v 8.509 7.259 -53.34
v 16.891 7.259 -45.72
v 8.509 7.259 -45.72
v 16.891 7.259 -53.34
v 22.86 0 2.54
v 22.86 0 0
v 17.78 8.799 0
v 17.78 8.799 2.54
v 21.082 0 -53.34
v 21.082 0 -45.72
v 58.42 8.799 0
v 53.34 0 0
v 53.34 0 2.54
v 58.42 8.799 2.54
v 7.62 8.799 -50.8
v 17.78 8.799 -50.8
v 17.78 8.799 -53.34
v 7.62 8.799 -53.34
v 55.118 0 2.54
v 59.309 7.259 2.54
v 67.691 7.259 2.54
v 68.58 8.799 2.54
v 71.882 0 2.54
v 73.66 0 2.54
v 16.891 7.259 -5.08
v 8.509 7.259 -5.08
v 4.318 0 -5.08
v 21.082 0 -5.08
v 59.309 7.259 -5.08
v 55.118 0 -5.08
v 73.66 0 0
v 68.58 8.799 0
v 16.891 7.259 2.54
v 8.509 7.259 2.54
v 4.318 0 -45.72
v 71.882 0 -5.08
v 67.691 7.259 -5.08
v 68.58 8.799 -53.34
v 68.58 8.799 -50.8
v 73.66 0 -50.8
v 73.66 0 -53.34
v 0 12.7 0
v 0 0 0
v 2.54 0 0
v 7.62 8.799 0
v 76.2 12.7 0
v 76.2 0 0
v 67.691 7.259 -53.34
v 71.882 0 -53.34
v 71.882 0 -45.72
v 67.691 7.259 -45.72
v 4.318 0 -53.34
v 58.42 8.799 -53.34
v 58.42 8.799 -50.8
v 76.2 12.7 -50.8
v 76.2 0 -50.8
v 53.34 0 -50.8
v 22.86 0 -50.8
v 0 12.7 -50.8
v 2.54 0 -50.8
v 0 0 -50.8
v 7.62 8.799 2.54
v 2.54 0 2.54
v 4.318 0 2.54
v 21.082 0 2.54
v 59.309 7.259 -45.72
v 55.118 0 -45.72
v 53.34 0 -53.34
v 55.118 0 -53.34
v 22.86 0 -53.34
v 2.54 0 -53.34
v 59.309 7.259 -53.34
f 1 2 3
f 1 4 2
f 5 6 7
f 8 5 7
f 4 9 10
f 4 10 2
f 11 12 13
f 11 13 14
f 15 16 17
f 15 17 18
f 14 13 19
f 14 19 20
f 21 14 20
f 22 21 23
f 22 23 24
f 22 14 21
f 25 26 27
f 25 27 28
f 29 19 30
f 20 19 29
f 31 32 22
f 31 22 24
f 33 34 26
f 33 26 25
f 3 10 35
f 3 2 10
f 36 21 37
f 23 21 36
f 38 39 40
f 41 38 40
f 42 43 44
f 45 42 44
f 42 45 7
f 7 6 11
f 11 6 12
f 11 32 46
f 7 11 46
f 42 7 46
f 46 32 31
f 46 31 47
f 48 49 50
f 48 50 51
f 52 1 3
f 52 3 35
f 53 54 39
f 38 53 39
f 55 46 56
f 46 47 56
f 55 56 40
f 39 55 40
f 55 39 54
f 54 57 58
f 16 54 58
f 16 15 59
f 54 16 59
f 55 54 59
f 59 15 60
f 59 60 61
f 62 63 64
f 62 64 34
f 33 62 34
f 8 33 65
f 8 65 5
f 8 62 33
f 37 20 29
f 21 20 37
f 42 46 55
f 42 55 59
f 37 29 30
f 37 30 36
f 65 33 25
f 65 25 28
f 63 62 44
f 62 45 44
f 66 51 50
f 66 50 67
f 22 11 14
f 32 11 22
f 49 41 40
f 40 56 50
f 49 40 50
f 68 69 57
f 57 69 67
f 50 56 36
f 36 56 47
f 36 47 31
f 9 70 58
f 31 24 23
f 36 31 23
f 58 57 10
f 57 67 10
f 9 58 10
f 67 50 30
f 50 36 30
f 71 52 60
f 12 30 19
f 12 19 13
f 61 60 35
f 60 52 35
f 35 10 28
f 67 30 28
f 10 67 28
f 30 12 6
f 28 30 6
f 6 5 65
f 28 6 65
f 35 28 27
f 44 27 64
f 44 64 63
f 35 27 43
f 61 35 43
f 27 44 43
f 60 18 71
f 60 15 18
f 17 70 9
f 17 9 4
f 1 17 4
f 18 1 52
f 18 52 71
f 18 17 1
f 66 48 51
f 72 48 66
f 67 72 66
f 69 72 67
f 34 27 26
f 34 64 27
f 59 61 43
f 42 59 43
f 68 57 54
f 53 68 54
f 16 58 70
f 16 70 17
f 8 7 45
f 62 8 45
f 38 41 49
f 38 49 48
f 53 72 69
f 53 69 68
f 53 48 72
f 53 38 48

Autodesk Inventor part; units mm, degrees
ref_plane "YZ Plane" through (0, 0, 0) normal (1, 0, 0) x (0, 1, 0)
ref_plane "XZ Plane" through (0, 0, 0) normal (0, 1, 0) x (-1, 0, 0)
ref_plane "XY Plane" through (0, 0, 0) normal (0, 0, 1) x (1, 0, 0)
sketch "Sketch1" plane through (0, 0, 0) normal (0, 1, 0) x (-1, 0, 0)
  line L0 (0, 0) -> (-76.2, 0)
  line L1 (-76.2, 0) -> (-76.2, -50.8)
  line L2 (-76.2, -50.8) -> (0, -50.8)
  line L3 (0, -50.8) -> (0, 0)
  dimension "d0" = 76.2
  dimension "d1" = 50.8
extrude "Extrusion1" add sketch "Sketch1" along normal blind 12.7
sketch "Sketch5" plane through (76.2, 0, -50.8) normal (0, 0, -1) x (-1, 0, 0)
  line L0 (76.2, 0) -> (73.66, 0)
  line L1 (76.2, 0) -> (0, 0) projected
  line L2 (73.66, 0) -> (53.34, 0)
  line L3 (53.34, 0) -> (58.42, 8.7988)
  line L4 (58.42, 8.7988) -> (68.58, 8.7988)
  line L5 (68.58, 8.7988) -> (73.66, 0)
  dimension "d9" = 2.54
  dimension "d10" = 20.32
  dimension "d11" = 10.16
  dimension "d12" = 60
  dimension "d13" = 10.16
extrude "Extrusion2" add sketch "Sketch5" along normal blind 2.54
sketch "Sketch6" plane through (76.2, 12.7, -50.8) normal (0, 0, -1) x (-1, 0, 0)
  line L0 (76.2, -12.7) -> (0, -12.7) projected
  line L1 (0, -12.7) -> (2.54, -12.7)
  line L2 (2.54, -12.7) -> (22.86, -12.7)
  line L3 (22.86, -12.7) -> (17.78, -3.9012)
  line L4 (17.78, -3.9012) -> (7.62, -3.9012)
  line L5 (7.62, -3.9012) -> (2.54, -12.7)
  dimension "d16" = 2.54
  dimension "d17" = 20.32
  dimension "d18" = 10.16
  dimension "d19" = 60
  dimension "d20" = 10.16
extrude "Extrusion3" add sketch "Sketch6" along normal blind 2.54
sketch "Sketch7" plane through (0, 0, 0) normal (0, 0, 1) x (1, 0, 0)
  line L0 (2.54, 0) -> (0, 0) projected
  line L1 (0, 0) -> (2.54, 0)
  line L2 (22.86, 0) -> (2.54, 0) projected
  line L3 (2.54, 0) -> (22.86, 0)
  line L4 (22.86, 0) -> (17.78, 8.7988) projected
  line L5 (22.86, 0) -> (17.78, 8.7988)
  line L6 (17.78, 8.7988) -> (7.62, 8.7988) projected
  line L7 (17.78, 8.7988) -> (7.62, 8.7988)
  line L8 (7.62, 8.7988) -> (2.54, 0) projected
  line L9 (7.62, 8.7988) -> (2.54, 0)
  dimension "d23" = 20.32
  dimension "d24" = 10.16
  dimension "d25" = 60
extrude "Extrusion4" add sketch "Sketch7" along normal blind 2.54
sketch "Sketch8" plane through (0, 12.7, 0) normal (0, 0, 1) x (1, 0, 0)
  line L0 (76.2, -12.7) -> (73.66, -12.7) projected
  line L1 (76.2, -12.7) -> (73.66, -12.7)
  line L2 (53.34, -12.7) -> (58.42, -3.9012) projected
  line L3 (73.66, -12.7) -> (53.34, -12.7)
  line L4 (53.34, -12.7) -> (58.42, -3.9012)
  line L5 (58.42, -3.9012) -> (68.58, -3.9012)
  line L6 (68.58, -3.9012) -> (73.66, -12.7) projected
  line L7 (68.58, -3.9012) -> (73.66, -12.7)
  point P0 (0, -12.7)
  dimension "d28" = 10.16
extrude "Extrusion5" add sketch "Sketch8" along normal blind 2.54
sketch "Sketch10" plane through (76.2, 12.7, -53.34) normal (0, 0, -1) x (-1, 0, 0)
  line L0 (7.62, -3.9012) -> (2.54, -12.7) projected
  line L1 (2.54, -12.7) -> (12.7, -12.7)
  line L2 (2.54, -12.7) -> (22.86, -12.7) projected
  line L3 (2.54, -12.7) -> (4.318, -12.7)
  line L4 (4.318, -12.7) -> (8.509, -5.441)
  line L5 (8.509, -5.441) -> (16.891, -5.441)
  line L6 (16.891, -5.441) -> (21.082, -12.7)
  line L7 (21.082, -12.7) -> (16.891, -19.959)
  line L8 (16.891, -19.959) -> (8.509, -19.959)
  line L9 (8.509, -19.959) -> (4.318, -12.7)
  point P0 (76.2, -12.7)
  dimension "d31" = 1.778
extrude "Extrusion6" cut sketch "Sketch10" against normal blind 7.62
sketch "Sketch11" plane through (76.2, 0, -53.34) normal (0, 0, -1) x (-1, 0, 0)
  line L0 (53.34, 0) -> (73.66, 0) projected
  line L1 (53.34, 0) -> (63.5, 0)
  line L2 (22.86, 0) -> (53.34, 0) projected
  line L3 (53.34, 0) -> (55.118, 0)
  line L4 (55.118, 0) -> (59.309, 7.259)
  line L5 (59.309, 7.259) -> (67.691, 7.259)
  line L6 (67.691, 7.259) -> (71.882, 0)
  line L7 (71.882, 0) -> (67.691, -7.259)
  line L8 (67.691, -7.259) -> (59.309, -7.259)
  line L9 (59.309, -7.259) -> (55.118, 0)
  point P0 (76.2, 0)
  dimension "d34" = 10.16
  dimension "d35" = 1.778
extrude "Extrusion7" cut sketch "Sketch11" against normal blind 7.62
sketch "Sketch12" plane through (0, 0, 2.54) normal (0, 0, 1) x (1, 0, 0)
  line L0 (0, 0) -> (2.54, 0) projected
  line L1 (2.54, 0) -> (12.7, 0)
  line L2 (2.54, 0) -> (22.86, 0) projected
  line L3 (2.54, 0) -> (4.318, 0)
  line L4 (4.318, 0) -> (8.509, 7.259)
  line L5 (8.509, 7.259) -> (16.891, 7.259)
  line L6 (16.891, 7.259) -> (21.082, 0)
  line L7 (21.082, 0) -> (16.891, -7.259)
  line L8 (16.891, -7.259) -> (8.509, -7.259)
  line L9 (8.509, -7.259) -> (4.318, 0)
  dimension "d38" = 10.16
  dimension "d39" = 1.778
extrude "Extrusion8" cut sketch "Sketch12" against normal blind 7.62
sketch "Sketch13" plane through (0, 12.7, 2.54) normal (0, 0, 1) x (1, 0, 0)
  line L0 (22.86, -12.7) -> (53.34, -12.7) projected
  line L1 (53.34, -12.7) -> (63.5, -12.7)
  line L2 (53.34, -12.7) -> (73.66, -12.7) projected
  line L3 (53.34, -12.7) -> (55.118, -12.7)
  line L4 (55.118, -12.7) -> (59.309, -5.441)
  line L5 (59.309, -5.441) -> (67.691, -5.441)
  line L6 (67.691, -5.441) -> (71.882, -12.7)
  line L7 (71.882, -12.7) -> (67.691, -19.959)
  line L8 (67.691, -19.959) -> (59.309, -19.959)
  line L9 (59.309, -19.959) -> (55.118, -12.7)
  point P0 (0, -12.7)
  dimension "d42" = 10.16
  dimension "d43" = 1.778
extrude "Extrusion9" cut sketch "Sketch13" against normal blind 7.62
properties part number "tesla v2"
